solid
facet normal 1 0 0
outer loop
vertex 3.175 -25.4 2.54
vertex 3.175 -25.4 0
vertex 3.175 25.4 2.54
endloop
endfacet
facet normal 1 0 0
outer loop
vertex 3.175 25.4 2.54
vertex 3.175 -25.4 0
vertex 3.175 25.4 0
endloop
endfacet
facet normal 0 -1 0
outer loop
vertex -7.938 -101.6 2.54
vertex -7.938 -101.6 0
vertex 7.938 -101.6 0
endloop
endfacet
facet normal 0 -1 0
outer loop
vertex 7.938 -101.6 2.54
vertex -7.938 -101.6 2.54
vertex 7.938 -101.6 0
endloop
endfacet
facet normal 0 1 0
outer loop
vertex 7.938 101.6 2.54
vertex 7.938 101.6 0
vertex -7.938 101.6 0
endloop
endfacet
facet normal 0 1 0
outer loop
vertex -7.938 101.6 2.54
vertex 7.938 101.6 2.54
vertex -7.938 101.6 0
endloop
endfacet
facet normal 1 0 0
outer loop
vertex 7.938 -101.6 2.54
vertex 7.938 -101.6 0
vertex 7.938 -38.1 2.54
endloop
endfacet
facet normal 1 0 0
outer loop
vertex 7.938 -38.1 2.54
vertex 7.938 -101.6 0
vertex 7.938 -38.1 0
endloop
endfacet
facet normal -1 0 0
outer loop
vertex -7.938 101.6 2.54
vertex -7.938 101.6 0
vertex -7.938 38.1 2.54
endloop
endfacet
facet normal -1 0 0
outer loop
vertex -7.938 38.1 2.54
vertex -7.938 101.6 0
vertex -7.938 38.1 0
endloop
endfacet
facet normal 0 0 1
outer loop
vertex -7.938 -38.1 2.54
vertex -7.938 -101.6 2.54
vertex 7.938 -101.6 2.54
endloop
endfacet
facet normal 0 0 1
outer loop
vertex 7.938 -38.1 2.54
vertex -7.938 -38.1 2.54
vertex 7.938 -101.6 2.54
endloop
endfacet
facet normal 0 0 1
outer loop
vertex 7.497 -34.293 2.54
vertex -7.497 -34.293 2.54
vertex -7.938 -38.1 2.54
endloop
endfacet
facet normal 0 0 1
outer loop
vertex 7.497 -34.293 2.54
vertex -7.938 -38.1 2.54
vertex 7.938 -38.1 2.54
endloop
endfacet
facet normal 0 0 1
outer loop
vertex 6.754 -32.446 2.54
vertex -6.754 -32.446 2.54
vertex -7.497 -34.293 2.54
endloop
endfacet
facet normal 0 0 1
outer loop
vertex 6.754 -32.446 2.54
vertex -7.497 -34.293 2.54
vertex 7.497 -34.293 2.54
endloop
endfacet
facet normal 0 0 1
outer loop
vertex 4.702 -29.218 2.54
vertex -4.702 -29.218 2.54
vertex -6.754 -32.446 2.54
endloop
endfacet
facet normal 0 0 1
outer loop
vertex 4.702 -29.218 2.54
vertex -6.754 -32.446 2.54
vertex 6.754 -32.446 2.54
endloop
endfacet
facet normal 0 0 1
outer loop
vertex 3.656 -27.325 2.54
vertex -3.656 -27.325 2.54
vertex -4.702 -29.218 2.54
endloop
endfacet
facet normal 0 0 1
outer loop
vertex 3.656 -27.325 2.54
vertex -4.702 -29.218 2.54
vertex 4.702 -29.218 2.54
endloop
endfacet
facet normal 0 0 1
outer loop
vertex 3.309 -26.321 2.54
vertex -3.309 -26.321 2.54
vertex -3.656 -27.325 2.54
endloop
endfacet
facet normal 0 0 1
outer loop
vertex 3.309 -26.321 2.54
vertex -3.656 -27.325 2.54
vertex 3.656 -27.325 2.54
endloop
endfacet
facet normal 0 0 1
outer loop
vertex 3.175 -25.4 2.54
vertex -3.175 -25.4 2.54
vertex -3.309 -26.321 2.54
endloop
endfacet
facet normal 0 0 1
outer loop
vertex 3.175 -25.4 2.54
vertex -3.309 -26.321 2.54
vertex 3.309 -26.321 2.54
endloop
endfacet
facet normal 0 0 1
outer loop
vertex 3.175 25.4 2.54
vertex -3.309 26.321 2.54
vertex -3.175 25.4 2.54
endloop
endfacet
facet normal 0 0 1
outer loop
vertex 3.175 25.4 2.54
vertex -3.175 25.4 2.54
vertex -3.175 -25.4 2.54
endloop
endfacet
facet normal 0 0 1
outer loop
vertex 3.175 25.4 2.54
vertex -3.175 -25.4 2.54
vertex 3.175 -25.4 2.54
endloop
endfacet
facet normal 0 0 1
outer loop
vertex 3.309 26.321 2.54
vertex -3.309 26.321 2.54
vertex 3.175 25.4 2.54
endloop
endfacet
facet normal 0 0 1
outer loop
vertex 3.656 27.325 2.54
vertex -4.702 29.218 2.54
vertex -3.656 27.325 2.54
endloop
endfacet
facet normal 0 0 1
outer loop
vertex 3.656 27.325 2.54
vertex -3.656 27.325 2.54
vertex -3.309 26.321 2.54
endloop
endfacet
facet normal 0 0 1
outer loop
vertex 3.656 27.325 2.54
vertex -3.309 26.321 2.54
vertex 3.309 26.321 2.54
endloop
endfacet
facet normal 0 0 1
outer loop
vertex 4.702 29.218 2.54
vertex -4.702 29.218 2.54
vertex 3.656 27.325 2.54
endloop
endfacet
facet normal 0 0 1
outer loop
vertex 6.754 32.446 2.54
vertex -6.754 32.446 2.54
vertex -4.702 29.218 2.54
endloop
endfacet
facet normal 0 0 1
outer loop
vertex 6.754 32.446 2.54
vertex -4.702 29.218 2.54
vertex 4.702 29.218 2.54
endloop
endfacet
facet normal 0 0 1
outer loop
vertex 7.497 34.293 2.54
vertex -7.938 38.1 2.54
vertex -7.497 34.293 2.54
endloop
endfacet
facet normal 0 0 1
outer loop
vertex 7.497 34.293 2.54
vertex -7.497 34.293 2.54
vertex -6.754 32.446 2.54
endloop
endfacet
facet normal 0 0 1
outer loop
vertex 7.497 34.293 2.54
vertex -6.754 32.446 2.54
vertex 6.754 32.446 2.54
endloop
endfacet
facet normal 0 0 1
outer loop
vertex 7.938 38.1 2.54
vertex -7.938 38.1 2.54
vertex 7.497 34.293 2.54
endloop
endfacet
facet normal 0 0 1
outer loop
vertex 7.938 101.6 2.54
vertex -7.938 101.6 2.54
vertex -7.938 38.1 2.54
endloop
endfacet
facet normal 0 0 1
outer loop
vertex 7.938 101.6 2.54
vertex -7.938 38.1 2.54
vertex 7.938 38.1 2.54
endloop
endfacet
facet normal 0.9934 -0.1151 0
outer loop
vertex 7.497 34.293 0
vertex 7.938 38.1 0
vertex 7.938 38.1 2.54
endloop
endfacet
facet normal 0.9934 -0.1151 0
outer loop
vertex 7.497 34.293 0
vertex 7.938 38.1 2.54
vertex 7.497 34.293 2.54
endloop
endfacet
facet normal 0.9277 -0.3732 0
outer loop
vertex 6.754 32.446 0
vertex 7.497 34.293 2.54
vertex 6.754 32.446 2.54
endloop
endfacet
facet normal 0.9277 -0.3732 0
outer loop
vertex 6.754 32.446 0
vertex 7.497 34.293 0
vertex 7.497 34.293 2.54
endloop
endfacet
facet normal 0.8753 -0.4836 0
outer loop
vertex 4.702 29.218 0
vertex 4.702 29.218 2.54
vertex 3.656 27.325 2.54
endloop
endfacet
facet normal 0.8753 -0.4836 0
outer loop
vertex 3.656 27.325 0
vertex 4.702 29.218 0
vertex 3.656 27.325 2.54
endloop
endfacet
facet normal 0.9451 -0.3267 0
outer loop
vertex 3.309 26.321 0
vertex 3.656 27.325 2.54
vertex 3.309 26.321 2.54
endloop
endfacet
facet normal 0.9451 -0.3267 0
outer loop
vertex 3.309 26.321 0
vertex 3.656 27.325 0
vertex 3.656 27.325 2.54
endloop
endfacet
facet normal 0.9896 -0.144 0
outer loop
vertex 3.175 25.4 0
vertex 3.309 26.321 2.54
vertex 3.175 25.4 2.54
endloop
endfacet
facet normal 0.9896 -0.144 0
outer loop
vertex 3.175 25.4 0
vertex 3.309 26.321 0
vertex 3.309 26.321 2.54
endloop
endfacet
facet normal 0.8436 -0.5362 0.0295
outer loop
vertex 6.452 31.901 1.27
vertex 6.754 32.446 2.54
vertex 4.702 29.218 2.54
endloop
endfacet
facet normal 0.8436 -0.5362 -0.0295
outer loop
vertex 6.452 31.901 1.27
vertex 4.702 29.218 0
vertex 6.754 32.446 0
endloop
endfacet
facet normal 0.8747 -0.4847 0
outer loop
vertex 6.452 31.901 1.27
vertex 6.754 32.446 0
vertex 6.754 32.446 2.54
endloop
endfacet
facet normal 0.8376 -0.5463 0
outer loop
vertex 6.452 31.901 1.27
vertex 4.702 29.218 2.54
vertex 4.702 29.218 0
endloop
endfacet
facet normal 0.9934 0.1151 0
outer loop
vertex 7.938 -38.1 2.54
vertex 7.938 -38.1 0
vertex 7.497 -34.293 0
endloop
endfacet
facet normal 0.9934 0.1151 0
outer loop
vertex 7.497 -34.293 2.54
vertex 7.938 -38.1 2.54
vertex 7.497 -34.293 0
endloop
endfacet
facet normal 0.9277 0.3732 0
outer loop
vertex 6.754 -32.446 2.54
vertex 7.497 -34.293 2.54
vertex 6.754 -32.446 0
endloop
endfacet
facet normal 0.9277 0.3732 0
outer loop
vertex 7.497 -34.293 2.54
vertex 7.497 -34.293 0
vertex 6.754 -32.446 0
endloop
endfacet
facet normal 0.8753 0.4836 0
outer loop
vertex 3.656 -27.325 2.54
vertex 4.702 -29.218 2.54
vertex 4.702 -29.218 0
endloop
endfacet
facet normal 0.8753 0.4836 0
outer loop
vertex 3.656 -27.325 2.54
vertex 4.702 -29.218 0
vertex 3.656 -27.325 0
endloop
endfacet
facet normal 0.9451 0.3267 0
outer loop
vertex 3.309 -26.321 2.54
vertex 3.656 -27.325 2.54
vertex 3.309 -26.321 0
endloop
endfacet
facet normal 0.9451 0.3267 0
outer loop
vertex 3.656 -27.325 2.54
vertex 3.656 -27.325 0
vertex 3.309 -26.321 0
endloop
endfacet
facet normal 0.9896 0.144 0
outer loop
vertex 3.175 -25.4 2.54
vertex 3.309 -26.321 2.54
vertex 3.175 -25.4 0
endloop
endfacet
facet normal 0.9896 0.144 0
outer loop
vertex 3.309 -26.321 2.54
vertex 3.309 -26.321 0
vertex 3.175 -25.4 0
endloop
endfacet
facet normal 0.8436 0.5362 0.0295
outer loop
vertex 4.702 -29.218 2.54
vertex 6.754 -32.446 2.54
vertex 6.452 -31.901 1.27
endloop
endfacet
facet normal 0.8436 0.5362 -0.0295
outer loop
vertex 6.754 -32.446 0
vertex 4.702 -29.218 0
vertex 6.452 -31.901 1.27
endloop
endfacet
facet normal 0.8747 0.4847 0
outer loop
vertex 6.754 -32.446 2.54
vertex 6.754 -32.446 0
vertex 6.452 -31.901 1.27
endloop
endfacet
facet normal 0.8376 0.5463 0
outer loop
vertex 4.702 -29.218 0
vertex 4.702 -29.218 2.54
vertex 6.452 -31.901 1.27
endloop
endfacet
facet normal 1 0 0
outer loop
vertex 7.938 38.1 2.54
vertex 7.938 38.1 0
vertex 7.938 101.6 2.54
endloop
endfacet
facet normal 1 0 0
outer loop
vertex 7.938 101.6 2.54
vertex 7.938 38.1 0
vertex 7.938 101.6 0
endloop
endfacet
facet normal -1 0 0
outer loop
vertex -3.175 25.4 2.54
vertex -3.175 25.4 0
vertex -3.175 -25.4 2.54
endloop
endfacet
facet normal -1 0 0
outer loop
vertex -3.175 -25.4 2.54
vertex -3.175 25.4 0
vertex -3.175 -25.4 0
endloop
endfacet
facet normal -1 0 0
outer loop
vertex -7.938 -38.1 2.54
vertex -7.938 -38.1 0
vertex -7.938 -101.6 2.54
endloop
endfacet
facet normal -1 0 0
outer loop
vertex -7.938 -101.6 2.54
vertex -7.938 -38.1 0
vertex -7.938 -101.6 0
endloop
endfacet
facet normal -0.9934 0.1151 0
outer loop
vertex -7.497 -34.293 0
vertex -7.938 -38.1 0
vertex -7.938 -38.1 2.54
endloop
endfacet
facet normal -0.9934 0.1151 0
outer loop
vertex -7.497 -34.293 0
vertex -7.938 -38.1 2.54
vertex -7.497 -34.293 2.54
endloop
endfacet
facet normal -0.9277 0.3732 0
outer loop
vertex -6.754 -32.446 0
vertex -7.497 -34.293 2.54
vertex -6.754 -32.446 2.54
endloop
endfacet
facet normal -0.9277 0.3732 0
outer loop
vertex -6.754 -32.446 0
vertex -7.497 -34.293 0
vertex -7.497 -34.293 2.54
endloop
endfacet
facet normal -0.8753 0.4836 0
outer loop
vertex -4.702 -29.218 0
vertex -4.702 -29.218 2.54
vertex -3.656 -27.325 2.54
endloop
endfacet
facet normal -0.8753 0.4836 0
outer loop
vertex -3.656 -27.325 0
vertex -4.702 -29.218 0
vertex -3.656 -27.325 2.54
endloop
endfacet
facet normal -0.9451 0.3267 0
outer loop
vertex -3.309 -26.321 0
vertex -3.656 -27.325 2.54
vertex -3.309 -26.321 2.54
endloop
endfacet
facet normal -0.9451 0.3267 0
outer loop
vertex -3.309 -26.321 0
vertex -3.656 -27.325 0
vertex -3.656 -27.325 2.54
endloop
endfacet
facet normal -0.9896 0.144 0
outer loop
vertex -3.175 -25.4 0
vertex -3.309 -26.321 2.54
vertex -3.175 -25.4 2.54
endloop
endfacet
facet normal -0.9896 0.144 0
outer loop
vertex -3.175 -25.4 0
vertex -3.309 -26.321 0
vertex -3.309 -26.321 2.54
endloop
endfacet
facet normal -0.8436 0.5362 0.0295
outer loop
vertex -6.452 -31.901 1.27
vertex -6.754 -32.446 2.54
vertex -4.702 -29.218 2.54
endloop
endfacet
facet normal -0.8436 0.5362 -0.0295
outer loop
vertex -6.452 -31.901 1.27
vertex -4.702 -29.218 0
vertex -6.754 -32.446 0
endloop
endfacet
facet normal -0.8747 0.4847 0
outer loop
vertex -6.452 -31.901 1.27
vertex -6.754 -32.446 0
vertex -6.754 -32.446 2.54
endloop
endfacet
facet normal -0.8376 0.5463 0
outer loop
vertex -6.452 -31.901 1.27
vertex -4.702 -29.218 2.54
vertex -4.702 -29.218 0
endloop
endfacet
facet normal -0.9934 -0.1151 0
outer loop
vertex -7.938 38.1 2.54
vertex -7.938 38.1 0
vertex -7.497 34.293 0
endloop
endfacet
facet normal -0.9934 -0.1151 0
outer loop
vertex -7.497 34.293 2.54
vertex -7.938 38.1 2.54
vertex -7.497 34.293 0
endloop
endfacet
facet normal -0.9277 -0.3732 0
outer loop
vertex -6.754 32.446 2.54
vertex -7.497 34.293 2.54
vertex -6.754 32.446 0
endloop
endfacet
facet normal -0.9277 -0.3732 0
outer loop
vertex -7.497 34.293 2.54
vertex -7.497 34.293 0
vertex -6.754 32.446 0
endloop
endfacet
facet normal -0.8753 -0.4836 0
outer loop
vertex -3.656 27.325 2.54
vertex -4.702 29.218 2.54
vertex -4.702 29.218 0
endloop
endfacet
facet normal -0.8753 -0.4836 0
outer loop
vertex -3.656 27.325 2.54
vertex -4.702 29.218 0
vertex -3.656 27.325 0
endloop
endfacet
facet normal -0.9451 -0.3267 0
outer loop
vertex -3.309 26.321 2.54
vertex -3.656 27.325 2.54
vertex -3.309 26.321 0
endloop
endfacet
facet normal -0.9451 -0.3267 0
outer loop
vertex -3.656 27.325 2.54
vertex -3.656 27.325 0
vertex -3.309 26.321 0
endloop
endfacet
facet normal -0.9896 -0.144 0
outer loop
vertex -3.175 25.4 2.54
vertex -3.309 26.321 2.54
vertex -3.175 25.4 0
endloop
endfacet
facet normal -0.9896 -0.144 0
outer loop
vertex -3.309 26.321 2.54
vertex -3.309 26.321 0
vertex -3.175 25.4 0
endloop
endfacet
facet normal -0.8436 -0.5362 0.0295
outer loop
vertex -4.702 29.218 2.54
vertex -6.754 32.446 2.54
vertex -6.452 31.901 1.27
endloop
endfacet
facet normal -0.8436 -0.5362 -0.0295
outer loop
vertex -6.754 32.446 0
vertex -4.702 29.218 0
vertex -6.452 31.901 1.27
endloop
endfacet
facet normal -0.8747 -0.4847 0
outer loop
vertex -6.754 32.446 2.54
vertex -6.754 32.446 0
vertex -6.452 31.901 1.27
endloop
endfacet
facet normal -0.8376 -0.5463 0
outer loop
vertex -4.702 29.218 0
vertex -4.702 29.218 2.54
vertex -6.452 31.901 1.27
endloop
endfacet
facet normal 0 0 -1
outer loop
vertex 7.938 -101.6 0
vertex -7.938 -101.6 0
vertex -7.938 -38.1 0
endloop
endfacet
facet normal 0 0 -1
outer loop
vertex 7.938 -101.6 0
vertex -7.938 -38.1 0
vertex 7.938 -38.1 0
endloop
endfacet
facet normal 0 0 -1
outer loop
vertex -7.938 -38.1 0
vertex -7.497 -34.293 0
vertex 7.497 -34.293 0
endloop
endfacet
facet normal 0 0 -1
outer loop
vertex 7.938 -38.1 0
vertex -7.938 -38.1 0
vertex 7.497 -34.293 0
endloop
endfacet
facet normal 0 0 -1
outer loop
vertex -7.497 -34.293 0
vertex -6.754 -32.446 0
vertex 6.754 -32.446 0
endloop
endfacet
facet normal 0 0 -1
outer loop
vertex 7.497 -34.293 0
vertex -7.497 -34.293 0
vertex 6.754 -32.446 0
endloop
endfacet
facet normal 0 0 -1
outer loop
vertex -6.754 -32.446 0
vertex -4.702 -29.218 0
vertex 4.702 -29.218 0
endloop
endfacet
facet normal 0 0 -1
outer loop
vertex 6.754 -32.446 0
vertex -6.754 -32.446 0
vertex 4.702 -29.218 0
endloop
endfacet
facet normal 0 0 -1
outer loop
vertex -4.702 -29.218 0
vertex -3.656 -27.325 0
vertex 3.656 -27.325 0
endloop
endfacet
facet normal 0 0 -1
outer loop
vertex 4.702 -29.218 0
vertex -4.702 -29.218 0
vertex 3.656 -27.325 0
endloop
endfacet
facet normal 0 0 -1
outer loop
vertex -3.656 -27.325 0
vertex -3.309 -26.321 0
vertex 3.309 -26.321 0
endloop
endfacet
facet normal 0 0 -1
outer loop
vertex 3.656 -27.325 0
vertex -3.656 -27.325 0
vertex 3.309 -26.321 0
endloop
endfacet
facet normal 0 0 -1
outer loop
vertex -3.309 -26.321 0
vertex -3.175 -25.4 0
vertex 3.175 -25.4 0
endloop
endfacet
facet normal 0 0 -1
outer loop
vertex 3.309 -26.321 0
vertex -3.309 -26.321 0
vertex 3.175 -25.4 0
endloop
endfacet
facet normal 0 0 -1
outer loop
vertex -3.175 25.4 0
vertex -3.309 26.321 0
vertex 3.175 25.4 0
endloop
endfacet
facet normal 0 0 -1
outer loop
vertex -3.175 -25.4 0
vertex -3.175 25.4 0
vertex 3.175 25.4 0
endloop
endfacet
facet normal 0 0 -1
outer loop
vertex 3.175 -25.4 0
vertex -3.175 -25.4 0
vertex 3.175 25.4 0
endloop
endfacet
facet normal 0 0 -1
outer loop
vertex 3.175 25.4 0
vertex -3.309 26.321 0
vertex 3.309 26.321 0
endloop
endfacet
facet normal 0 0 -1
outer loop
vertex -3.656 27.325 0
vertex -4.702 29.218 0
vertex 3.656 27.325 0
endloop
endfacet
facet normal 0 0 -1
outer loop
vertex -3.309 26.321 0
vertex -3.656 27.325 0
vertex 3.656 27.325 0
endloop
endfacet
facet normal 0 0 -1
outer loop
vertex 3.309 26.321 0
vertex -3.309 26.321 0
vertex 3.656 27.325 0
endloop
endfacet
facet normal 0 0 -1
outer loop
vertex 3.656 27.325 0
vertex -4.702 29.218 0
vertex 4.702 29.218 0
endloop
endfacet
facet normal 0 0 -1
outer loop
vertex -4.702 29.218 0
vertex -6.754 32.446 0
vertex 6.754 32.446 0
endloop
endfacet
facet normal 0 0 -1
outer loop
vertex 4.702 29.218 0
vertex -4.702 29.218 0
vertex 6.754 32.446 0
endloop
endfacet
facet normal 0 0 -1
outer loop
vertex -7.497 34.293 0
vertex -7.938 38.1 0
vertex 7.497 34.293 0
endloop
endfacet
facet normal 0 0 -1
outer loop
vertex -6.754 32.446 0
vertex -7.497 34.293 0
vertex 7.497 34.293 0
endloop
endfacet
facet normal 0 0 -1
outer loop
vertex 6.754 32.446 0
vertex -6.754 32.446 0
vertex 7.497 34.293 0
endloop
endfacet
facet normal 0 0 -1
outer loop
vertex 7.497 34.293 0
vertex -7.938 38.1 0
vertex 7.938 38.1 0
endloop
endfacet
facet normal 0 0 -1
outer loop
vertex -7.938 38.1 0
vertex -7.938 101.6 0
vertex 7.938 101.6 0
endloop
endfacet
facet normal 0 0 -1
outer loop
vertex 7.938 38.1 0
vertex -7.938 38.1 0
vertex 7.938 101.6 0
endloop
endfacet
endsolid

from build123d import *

# Parameters (mm, degrees)
BOSS_EXTRUDE1_DEPTH = 2.54


with BuildPart() as part:
    # Sketch1 → Boss-Extrude1 (new body)
    with BuildSketch(Plane.XY):
        with BuildLine():
            Line((-7.9375, -101.6), (7.9375, -101.6))
            Line((7.9375, -101.6), (7.9375, -38.1))
            add(Edge.make_bspline(
                [(7.9375, -38.1), (7.9375, -35.419414326), (7.08508997, -31.89666435), (3.252877068, -27.63987608), (3.175, -25.4)],
                knots=[0, 0, 0, 0, 0.475835687, 1, 1, 1, 1], degree=3))
            Line((3.175, -25.4), (3.175, 25.4))
            add(Edge.make_bspline(
                [(7.9375, 38.1), (7.9375, 35.419414326), (7.08508997, 31.89666435), (3.252877068, 27.63987608), (3.175, 25.4)],
                knots=[0, 0, 0, 0, 0.475835687, 1, 1, 1, 1], degree=3))
            Line((7.9375, 38.1), (7.9375, 101.6))
            Line((7.9375, 101.6), (-7.9375, 101.6))
            Line((-7.9375, 101.6), (-7.9375, 38.1))
            add(Edge.make_bspline(
                [(-7.9375, 38.1), (-7.9375, 35.419414326), (-7.08508997, 31.89666435), (-3.252877068, 27.63987608), (-3.175, 25.4)],
                knots=[0, 0, 0, 0, 0.475835687, 1, 1, 1, 1], degree=3))
            Line((-3.175, 25.4), (-3.175, -25.4))
            add(Edge.make_bspline(
                [(-7.9375, -38.1), (-7.9375, -35.419414326), (-7.08508997, -31.89666435), (-3.252877068, -27.63987608), (-3.175, -25.4)],
                knots=[0, 0, 0, 0, 0.475835687, 1, 1, 1, 1], degree=3))
            Line((-7.9375, -38.1), (-7.9375, -101.6))
        make_face()
    extrude(amount=BOSS_EXTRUDE1_DEPTH)


solid = part.part
